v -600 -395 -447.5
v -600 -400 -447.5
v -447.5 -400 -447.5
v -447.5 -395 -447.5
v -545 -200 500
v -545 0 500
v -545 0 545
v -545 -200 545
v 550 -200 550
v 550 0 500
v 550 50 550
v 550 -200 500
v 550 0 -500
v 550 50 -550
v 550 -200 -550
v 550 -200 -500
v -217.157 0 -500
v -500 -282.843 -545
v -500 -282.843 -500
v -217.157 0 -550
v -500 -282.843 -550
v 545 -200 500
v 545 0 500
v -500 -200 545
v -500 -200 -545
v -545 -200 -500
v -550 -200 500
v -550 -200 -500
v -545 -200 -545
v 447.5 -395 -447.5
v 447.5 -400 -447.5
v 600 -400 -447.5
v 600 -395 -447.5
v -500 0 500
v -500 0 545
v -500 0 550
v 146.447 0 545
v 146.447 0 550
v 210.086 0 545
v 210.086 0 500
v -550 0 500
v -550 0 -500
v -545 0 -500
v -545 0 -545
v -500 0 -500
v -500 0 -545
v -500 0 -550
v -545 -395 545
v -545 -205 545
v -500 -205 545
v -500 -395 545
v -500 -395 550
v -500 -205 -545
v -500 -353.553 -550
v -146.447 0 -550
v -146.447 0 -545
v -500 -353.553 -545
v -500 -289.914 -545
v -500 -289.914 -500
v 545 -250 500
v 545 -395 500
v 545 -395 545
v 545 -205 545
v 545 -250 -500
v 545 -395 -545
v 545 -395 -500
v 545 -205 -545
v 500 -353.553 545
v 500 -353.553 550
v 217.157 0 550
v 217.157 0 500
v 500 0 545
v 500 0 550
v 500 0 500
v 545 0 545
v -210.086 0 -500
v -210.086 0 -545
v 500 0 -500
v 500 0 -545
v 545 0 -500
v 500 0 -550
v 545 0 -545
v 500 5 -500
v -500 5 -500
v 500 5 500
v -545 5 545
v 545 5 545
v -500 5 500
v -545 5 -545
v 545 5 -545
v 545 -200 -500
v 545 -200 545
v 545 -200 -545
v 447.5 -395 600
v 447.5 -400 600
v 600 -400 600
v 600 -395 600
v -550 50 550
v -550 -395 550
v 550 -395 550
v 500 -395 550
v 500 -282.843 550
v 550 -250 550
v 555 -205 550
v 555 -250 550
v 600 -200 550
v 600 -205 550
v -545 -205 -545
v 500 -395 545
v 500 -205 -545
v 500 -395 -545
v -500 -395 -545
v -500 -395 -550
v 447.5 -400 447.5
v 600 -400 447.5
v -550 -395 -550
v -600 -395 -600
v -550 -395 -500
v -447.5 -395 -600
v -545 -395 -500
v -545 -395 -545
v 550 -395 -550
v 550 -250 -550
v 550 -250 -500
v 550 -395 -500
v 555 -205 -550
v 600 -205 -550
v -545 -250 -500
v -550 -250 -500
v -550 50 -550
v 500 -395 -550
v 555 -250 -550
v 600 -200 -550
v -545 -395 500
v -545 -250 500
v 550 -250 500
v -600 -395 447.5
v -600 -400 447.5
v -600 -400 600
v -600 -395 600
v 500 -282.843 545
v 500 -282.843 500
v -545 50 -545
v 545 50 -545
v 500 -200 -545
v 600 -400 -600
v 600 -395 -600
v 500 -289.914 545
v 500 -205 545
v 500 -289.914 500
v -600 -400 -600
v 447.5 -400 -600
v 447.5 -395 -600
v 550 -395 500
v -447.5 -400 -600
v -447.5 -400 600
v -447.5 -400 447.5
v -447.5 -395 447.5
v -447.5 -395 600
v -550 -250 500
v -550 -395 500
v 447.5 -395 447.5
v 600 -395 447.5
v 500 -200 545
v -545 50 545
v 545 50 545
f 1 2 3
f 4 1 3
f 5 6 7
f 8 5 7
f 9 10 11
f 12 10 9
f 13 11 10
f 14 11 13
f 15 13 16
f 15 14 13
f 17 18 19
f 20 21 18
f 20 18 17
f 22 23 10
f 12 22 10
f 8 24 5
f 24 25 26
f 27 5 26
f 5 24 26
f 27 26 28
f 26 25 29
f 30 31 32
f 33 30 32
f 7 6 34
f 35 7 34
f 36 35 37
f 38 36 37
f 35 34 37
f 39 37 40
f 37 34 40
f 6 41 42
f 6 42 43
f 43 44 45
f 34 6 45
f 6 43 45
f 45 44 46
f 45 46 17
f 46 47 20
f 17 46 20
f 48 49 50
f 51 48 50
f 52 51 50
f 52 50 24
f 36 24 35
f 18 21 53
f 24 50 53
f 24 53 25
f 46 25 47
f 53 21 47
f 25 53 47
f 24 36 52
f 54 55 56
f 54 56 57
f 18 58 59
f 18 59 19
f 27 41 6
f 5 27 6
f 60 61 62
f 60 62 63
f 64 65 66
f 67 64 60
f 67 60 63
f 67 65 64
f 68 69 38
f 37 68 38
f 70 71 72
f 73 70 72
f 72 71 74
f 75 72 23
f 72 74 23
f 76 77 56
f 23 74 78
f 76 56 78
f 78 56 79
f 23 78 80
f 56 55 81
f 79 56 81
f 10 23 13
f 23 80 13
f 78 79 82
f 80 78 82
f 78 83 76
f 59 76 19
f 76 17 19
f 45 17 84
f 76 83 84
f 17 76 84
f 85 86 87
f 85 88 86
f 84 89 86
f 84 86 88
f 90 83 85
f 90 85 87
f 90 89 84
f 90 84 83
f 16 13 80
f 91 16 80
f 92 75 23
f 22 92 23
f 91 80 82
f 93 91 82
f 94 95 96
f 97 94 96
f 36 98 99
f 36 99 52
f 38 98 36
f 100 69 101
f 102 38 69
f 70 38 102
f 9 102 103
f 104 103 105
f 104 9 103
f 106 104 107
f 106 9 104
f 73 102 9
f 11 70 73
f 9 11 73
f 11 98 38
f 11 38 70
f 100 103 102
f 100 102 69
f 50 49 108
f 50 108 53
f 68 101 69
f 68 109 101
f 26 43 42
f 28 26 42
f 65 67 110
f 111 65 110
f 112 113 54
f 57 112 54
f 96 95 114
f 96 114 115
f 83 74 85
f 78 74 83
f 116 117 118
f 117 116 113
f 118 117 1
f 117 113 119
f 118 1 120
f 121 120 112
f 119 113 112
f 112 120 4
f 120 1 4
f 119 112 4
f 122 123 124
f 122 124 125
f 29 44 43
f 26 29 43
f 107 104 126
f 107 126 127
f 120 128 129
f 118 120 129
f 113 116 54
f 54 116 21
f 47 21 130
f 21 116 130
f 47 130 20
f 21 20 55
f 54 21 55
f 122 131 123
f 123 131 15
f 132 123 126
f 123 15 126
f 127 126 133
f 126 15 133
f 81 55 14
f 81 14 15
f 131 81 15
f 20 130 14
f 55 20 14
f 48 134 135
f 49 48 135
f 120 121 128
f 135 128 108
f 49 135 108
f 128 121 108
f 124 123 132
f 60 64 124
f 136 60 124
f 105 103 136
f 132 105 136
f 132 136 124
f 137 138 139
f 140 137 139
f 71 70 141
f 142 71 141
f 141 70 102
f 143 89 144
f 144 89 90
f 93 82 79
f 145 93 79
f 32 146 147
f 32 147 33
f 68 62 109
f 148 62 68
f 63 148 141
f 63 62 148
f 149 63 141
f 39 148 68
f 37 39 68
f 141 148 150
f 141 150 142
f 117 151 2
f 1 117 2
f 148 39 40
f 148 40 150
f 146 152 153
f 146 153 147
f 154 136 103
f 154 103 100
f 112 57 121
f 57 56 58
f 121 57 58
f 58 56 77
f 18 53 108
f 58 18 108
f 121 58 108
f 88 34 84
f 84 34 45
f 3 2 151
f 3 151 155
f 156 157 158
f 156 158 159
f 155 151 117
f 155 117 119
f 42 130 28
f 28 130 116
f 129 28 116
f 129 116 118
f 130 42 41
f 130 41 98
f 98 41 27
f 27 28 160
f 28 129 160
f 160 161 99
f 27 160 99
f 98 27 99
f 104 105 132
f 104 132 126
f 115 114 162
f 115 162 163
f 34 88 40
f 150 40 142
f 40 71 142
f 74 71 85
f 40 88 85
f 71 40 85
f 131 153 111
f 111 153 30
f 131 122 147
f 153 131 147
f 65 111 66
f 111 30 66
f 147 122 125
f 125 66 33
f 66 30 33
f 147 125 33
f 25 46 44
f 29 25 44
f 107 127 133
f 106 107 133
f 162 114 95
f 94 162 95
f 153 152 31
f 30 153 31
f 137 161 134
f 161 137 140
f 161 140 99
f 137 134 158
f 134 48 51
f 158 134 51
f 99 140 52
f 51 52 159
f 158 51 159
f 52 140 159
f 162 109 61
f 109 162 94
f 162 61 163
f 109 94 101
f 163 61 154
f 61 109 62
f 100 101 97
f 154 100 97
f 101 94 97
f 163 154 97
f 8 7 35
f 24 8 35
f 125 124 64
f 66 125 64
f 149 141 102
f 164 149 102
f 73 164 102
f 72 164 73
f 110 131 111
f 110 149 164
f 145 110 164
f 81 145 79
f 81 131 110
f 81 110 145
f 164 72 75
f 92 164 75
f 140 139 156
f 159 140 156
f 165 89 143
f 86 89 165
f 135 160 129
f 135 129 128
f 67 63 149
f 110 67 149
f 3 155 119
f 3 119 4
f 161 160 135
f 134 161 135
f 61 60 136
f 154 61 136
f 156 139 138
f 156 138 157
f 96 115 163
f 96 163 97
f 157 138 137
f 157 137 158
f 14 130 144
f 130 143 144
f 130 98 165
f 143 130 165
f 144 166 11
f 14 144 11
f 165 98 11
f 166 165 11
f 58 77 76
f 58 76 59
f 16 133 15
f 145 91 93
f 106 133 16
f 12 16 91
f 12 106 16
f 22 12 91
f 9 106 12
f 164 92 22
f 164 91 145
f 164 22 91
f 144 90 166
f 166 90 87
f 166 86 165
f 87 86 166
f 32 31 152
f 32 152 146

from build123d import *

# Parameters (mm, degrees)
SKETCH_1_W       = 1100
SKETCH_1_H       = 1100
SKETCH_1_W_2     = 1000
SKETCH_1_H_2     = 1000
EXTRUDE_1_DEPTH  = 5
SKETCH_2_W       = 1100
SKETCH_2_H       = 1100
SKETCH_2_W_2     = 1090
SKETCH_2_H_2     = 1090
EXTRUDE_2_DEPTH  = 45
EXTRUDE_3_DEPTH  = 400
SKETCH_4_W       = 152.5
SKETCH_4_H       = 152.5
EXTRUDE_4_DEPTH  = 5
EXTRUDE_6_REACH  = 1355.154
EXTRUDE_7_DEPTH  = 5
EXTRUDE_8_DEPTH  = 45
EXTRUDE_9_DEPTH  = 5
EXTRUDE_10_DEPTH = 45
EXTRUDE_11_DEPTH = 1100


with BuildPart() as part:
    # Эскиз1 → Бобышка-Вытянуть1 (new body)
    with BuildSketch(Plane(origin=(0, 0, 0), x_dir=(1, 0, 0), z_dir=(0, 1, 0))):
        Rectangle(SKETCH_1_W, SKETCH_1_H)
        Rectangle(SKETCH_1_W_2, SKETCH_1_H_2, mode=Mode.SUBTRACT)
    extrude(amount=EXTRUDE_1_DEPTH)

    # Эскиз2 → Бобышка-Вытянуть2 (add)
    with BuildSketch(Plane.XZ.offset(-5)):
        Rectangle(SKETCH_2_W, SKETCH_2_H)
        Rectangle(SKETCH_2_W_2, SKETCH_2_H_2, mode=Mode.SUBTRACT)
    extrude(amount=-EXTRUDE_2_DEPTH)

    # Эскиз3 → Бобышка-Вытянуть3 (add)
    with BuildSketch(Plane.XZ):
        Polygon((550, 550), (500, 550), (500, 545), (545, 545), (545, 500), (550, 500), align=None)
        Polygon((545, -500), (545, -545), (500, -545), (500, -550), (550, -550), (550, -500), align=None)
        Polygon((-550, -550), (-500, -550), (-500, -545), (-545, -545), (-545, -500), (-550, -500), align=None)
        Polygon((-545, 500), (-545, 545), (-500, 545), (-500, 550), (-550, 550), (-550, 500), align=None)
    extrude(amount=EXTRUDE_3_DEPTH)

    # Эскиз4 → Бобышка-Вытянуть4 (add)
    with BuildSketch(Plane.XZ.offset(400)):
        with Locations((523.75, 523.75)):
            Rectangle(SKETCH_4_W, SKETCH_4_H)
        with Locations((523.75, -523.75)):
            Rectangle(SKETCH_4_W, SKETCH_4_H)
        with Locations((-523.75, -523.75)):
            Rectangle(SKETCH_4_W, SKETCH_4_H)
        with Locations((-523.75, 523.75)):
            Rectangle(SKETCH_4_W, SKETCH_4_H)
    extrude(amount=-EXTRUDE_4_DEPTH)

    # Бобышка-Вытянуть6: up to this face of the body (flat: up to its plane)
    extrude_6_end = Plane(part.part.faces().sort_by_distance((522.5, -197.5, 545))[0])
    # Эскиз6 → Бобышка-Вытянуть6 (add, up to the picked face)
    with BuildSketch(Plane.XY.offset(-545), mode=Mode.PRIVATE) as extrude_6_sk1:
        Polygon((500, -200), (550, -200), (550, -250), (545, -250), (545, -205), (500, -205), align=None)
    extrude_6_tool1 = split(extrude(extrude_6_sk1.sketch, amount=EXTRUDE_6_REACH, mode=Mode.PRIVATE), bisect_by=extrude_6_end, keep=Keep.BOTH, mode=Mode.PRIVATE)
    # Эскиз6 → Бобышка-Вытянуть6 (add, up to the picked face)
    with BuildSketch(Plane.XY.offset(-545), mode=Mode.PRIVATE) as extrude_6_sk2:
        Polygon((-545, -250), (-545, -205), (-500, -205), (-500, -200), (-550, -200), (-550, -250), align=None)
    extrude_6_tool2 = split(extrude(extrude_6_sk2.sketch, amount=EXTRUDE_6_REACH, mode=Mode.PRIVATE), bisect_by=extrude_6_end, keep=Keep.BOTH, mode=Mode.PRIVATE)
    add(extrude_6_tool1.solids().sort_by(Axis((525, -200.707107, -545), (0, 0, 1)))[0])
    add(extrude_6_tool2.solids().sort_by(Axis((-545.707107, -227.5, -545), (0, 0, 1)))[0])

    # Эскиз7 → Бобышка-Вытянуть7 (add)
    with BuildSketch(Plane.XY.offset(550)):
        Polygon((146.446609407, 0), (217.157287525, 0), (500, -282.842712475), (500, -353.553390593), align=None)
    extrude(amount=-EXTRUDE_7_DEPTH)

    # Эскиз8 → Бобышка-Вытянуть8 (add)
    with BuildSketch(Plane(origin=(0, 0, 545), x_dir=(-1, 0, 0), z_dir=(0, 0, -1))):
        Polygon((-217.157287525, 0), (-210.086219714, 0), (-500, -289.913780286), (-500, -282.842712475), align=None)
    extrude(amount=EXTRUDE_8_DEPTH)

    # Эскиз9 → Бобышка-Вытянуть9 (add)
    with BuildSketch(Plane(origin=(0, 0, -550), x_dir=(-1, 0, 0), z_dir=(0, 0, -1))):
        Polygon((146.446609407, 0), (500, -353.553390593), (500, -282.842712475), (217.157287525, 0), align=None)
    extrude(amount=-EXTRUDE_9_DEPTH)

    # Эскиз10 → Бобышка-Вытянуть10 (add)
    with BuildSketch(Plane.XY.offset(-545)):
        Polygon((-217.157287525, 0), (-210.086219714, 0), (-500, -289.913780286), (-500, -282.842712475), align=None)
    extrude(amount=EXTRUDE_10_DEPTH)

    # Эскиз11 → Бобышка-Вытянуть11 (add)
    with BuildSketch(Plane.XY.offset(550)):
        Polygon((550, -250), (555, -250), (555, -205), (600, -205), (600, -200), (550, -200), align=None)
    extrude(amount=-EXTRUDE_11_DEPTH)


solid = part.part
